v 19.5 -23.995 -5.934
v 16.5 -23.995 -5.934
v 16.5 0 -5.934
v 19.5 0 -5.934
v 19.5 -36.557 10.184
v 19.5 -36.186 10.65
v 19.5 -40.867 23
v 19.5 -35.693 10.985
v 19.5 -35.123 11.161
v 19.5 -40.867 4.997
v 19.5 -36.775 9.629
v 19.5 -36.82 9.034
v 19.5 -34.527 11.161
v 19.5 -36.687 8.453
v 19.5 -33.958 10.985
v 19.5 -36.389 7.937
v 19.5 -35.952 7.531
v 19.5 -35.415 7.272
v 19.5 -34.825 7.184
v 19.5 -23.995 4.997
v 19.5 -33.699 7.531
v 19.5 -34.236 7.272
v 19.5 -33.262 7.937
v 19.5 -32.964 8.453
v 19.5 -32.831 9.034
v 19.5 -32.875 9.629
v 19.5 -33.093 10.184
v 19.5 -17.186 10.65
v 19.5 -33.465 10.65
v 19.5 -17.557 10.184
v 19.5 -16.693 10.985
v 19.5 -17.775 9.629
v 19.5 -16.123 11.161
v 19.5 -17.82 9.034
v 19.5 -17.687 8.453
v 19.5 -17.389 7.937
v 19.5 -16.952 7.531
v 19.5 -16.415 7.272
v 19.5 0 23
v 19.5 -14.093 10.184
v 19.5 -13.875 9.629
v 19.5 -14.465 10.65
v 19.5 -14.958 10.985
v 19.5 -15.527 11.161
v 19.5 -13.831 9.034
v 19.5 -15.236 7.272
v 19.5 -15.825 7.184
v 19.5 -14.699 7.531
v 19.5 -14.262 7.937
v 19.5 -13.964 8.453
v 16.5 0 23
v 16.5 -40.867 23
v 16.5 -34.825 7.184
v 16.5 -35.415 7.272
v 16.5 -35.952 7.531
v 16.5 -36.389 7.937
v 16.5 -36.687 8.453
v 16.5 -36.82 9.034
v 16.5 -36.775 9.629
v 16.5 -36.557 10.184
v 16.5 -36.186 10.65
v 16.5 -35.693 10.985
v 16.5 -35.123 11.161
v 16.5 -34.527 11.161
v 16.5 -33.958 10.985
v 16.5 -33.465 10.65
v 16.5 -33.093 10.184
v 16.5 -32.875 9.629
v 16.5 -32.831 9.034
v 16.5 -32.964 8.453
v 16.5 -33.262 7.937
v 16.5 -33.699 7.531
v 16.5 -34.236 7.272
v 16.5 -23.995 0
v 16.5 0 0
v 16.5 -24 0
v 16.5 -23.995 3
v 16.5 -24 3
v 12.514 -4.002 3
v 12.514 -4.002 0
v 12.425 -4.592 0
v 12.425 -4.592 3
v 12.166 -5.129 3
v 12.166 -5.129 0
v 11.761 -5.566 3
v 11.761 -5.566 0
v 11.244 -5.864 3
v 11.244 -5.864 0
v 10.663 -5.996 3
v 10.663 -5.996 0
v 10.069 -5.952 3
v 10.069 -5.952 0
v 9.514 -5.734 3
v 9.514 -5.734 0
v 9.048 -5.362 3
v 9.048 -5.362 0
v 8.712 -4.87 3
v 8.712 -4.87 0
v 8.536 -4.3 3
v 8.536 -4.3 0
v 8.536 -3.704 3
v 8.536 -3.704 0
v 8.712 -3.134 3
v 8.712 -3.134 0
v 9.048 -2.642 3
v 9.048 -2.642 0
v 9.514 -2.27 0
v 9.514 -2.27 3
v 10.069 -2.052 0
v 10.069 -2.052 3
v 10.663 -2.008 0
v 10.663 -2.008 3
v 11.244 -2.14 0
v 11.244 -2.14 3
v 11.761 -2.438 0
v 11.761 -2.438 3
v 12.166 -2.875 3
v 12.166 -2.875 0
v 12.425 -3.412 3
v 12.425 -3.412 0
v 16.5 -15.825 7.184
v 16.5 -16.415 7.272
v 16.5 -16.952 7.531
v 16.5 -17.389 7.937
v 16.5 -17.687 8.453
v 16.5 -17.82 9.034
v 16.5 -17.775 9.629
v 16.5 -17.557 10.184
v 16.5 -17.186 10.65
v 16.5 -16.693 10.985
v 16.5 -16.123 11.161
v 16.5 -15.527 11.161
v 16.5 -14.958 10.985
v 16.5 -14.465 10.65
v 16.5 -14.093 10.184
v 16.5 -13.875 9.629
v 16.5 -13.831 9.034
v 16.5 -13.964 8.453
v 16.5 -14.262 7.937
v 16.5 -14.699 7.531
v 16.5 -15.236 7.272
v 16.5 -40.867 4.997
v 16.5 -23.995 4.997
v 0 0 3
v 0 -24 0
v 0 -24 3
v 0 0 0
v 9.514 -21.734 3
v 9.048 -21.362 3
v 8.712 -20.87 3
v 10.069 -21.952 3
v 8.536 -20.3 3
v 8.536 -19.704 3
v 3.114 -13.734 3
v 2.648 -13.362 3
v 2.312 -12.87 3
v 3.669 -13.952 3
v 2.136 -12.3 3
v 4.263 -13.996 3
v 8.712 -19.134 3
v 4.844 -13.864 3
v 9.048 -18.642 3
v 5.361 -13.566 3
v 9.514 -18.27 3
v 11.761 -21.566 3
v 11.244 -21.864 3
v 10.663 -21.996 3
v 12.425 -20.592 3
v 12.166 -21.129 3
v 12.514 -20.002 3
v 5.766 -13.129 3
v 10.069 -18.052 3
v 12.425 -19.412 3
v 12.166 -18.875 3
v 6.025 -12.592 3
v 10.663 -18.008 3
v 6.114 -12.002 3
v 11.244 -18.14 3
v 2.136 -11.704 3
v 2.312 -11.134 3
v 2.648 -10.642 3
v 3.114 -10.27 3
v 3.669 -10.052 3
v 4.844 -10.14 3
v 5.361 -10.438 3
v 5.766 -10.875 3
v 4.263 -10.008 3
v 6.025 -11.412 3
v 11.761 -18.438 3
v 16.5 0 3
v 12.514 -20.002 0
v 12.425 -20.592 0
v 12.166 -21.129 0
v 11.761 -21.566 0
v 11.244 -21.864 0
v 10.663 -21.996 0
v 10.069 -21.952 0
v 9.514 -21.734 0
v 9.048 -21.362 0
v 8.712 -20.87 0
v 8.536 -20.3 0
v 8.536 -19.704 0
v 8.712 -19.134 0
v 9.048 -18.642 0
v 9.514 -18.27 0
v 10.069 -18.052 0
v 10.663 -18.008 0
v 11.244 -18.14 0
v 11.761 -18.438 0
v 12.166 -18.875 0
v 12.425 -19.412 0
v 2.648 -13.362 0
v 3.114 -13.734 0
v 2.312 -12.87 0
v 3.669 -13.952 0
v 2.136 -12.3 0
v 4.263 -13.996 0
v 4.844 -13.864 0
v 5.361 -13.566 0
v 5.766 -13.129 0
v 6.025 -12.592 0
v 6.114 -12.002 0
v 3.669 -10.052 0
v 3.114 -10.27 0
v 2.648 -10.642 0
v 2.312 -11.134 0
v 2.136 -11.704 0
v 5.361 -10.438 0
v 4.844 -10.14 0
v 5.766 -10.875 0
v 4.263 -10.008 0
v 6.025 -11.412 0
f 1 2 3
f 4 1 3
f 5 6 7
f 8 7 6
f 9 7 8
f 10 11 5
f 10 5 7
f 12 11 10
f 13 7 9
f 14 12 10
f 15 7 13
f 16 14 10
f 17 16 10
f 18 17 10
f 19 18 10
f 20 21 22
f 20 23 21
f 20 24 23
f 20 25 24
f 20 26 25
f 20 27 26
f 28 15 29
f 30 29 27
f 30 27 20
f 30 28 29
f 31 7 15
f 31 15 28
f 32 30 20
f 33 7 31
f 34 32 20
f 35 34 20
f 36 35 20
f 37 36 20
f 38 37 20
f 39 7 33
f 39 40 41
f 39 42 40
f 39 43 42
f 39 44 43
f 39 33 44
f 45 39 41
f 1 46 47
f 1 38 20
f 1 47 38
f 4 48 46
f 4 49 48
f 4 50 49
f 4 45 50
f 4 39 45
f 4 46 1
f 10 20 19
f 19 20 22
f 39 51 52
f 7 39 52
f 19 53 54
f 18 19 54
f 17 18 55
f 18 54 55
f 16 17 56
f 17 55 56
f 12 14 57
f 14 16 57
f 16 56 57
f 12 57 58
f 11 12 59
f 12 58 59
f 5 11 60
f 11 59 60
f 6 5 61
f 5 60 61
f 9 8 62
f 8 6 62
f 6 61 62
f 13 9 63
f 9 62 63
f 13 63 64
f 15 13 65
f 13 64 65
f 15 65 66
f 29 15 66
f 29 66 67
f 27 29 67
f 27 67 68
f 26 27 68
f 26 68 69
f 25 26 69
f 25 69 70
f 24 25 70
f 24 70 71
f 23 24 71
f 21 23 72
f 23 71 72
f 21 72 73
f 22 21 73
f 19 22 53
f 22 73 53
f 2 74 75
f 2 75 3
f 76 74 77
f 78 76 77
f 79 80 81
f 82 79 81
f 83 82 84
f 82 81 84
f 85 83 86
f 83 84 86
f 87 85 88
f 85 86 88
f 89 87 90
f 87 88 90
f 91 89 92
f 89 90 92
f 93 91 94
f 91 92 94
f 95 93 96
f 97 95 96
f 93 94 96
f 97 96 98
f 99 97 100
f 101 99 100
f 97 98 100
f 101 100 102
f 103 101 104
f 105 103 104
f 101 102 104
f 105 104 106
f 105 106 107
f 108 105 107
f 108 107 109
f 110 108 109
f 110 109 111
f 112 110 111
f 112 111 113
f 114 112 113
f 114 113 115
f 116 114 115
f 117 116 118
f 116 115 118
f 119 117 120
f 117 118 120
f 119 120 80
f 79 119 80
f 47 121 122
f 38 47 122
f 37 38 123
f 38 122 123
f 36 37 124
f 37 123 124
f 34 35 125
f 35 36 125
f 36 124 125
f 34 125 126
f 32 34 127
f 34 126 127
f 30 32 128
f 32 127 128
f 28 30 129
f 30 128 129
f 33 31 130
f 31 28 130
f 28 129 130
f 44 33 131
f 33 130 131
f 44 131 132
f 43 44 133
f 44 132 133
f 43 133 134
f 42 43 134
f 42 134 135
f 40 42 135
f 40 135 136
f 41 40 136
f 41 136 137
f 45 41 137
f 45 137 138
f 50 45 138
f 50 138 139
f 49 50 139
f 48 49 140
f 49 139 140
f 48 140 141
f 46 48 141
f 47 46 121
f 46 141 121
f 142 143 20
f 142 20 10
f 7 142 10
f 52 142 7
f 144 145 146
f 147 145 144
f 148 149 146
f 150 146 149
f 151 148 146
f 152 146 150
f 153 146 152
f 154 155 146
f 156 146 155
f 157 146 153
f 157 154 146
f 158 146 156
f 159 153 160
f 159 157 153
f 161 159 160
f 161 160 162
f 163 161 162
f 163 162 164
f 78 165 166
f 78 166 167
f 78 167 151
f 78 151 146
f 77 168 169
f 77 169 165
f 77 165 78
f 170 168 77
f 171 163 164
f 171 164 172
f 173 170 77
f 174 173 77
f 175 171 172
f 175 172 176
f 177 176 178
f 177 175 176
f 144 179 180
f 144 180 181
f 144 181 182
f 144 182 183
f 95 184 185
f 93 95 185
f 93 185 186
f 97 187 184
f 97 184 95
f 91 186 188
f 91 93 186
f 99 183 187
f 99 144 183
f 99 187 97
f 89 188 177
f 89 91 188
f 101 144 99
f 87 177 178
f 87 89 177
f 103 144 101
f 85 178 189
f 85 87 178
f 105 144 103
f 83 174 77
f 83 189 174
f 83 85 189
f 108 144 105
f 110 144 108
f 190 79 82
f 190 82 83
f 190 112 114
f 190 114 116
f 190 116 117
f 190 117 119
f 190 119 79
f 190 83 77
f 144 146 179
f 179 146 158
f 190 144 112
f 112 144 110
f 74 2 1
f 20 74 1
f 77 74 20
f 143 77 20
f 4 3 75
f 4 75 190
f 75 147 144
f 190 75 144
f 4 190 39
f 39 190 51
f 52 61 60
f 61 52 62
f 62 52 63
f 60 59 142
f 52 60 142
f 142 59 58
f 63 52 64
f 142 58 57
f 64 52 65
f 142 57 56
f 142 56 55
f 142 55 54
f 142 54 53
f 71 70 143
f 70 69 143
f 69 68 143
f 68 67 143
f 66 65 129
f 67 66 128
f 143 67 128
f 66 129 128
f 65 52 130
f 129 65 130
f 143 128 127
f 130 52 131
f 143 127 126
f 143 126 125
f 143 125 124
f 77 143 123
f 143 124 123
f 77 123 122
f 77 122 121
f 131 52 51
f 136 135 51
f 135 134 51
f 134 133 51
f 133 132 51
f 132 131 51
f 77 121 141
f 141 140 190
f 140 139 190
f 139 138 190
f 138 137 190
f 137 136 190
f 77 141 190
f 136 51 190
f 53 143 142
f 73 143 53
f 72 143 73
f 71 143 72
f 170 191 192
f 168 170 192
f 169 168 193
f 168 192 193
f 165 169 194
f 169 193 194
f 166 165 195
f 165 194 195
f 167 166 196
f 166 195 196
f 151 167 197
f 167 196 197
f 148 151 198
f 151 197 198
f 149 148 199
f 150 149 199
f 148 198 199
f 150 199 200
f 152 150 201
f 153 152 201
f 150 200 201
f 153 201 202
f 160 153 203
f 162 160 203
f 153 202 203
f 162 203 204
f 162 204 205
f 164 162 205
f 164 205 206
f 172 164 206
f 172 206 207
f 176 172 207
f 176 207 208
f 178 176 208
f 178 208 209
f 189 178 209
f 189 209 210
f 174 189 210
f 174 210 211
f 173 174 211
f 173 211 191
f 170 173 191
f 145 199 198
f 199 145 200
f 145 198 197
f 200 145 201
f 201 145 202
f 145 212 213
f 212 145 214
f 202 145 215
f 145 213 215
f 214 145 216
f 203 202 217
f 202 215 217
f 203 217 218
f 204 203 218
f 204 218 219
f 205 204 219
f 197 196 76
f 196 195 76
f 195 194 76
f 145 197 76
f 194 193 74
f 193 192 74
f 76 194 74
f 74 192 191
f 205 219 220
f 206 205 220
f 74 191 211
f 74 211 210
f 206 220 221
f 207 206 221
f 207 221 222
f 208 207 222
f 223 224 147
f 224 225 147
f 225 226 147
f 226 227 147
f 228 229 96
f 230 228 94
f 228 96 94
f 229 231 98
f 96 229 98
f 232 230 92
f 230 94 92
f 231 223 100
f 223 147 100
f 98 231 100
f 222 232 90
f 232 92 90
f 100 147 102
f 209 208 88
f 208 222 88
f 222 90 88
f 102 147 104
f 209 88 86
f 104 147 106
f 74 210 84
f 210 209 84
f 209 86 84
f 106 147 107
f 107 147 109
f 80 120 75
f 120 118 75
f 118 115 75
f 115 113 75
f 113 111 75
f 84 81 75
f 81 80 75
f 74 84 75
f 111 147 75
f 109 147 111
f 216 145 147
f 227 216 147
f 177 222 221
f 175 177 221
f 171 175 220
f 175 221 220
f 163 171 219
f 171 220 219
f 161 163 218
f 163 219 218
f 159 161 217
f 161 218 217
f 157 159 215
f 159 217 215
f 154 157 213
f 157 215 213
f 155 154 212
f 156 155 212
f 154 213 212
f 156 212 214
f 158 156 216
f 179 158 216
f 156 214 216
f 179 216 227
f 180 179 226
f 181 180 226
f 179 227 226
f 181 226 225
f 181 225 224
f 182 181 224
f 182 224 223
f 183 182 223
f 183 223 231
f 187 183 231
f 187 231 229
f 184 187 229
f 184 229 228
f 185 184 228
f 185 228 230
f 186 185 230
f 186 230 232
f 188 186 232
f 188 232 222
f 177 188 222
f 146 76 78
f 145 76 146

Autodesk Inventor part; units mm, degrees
ref_plane "YZ Plane" through (0, 0, 0) normal (1, 0, 0) x (0, 1, 0)
ref_plane "XZ Plane" through (0, 0, 0) normal (0, 1, 0) x (-1, 0, 0)
ref_plane "XY Plane" through (0, 0, 0) normal (0, 0, 1) x (1, 0, 0)
sketch "Sketch1" plane through (0, 0, 0) normal (0, 0, 1) x (1, 0, 0)
  line L0 (0, 0) -> (16.5, 0)
  line L1 (16.5, 0) -> (16.5, -24)
  line L2 (16.5, -24) -> (0, -24)
  line L3 (0, -24) -> (0, 0)
  line L4 (24.2611, -12.002) -> (-7.0214, -12.002)
  line L5 (10.5138, 0) -> (10.5138, -25.2396)
  line L6 (10.5138, -12.002) -> (10.5138, -20.002) construction
  line L7 (10.5138, -12.002) -> (10.5138, -4.002) construction
  circle A0 centre (10.5138, -4.002) radius 2
  circle A1 centre (10.5138, -20.002) radius 2
  circle A2 centre (4.1138, -12.002) radius 2
  dimension "d0" = 16.5
  dimension "d1" = 24
  dimension "d2" = 8
  dimension "d3" = 8
  dimension "d4" = 4
  dimension "d5" = 4
  dimension "d7" = 4
extrude "Extrusion1" add sketch "Sketch1" along normal blind 3 contours L0 L5 A0 L4 A2 L3 | L0 L1 L4 L5 A0 | L4 A2 L5 A1 L2 L3 | L1 L2 L5 A1 L4
sketch "Sketch2" plane through (16.5, -24, 0) normal (1, 0, 0) x (0, 0, -1)
  line L0 (-3, -16.8669) -> (-3, 24)
  line L1 (-3, -16.8669) -> (-23, -16.8669)
  line L2 (-23, -16.8669) -> (5.9335, -16.8669)
  line L3 (5.9335, -16.8669) -> (5.9335, 24)
  line L4 (5.9335, 24) -> (-23, 24)
  line L5 (-23, 24) -> (-23, -16.8669)
  circle A0 centre (-9.1835, 8.1747) radius 2
  line L6 (-9.1835, 8.1747) -> (-9.1835, -10.8253) construction
  circle A1 centre (-9.1835, -10.8253) radius 2
  dimension "d11" = 20
  dimension "d12" = 4
  dimension "d13" = 19
  dimension "d14" = 4
extrude "Extrusion2" add sketch "Sketch2" along normal blind 3
sketch "Sketch3" plane through (16.5, -24, 0) normal (-1, 0, 0) x (0, 0, 1)
  line L0 (-5.9335, -16.8669) -> (-5.9335, 24) projected
  line L1 (-5.9335, 0.0047) -> (4.9967, 0.0047)
  line L2 (4.9967, 0.0047) -> (4.9967, -16.8669)
  line L3 (4.9967, -16.8669) -> (-5.9335, -16.8669)
  line L4 (-5.9335, -16.8669) -> (-5.9335, 0.0047)
extrude "Extrusion3" cut sketch "Sketch3" against normal through all
properties part number "bart y endstop v2"
